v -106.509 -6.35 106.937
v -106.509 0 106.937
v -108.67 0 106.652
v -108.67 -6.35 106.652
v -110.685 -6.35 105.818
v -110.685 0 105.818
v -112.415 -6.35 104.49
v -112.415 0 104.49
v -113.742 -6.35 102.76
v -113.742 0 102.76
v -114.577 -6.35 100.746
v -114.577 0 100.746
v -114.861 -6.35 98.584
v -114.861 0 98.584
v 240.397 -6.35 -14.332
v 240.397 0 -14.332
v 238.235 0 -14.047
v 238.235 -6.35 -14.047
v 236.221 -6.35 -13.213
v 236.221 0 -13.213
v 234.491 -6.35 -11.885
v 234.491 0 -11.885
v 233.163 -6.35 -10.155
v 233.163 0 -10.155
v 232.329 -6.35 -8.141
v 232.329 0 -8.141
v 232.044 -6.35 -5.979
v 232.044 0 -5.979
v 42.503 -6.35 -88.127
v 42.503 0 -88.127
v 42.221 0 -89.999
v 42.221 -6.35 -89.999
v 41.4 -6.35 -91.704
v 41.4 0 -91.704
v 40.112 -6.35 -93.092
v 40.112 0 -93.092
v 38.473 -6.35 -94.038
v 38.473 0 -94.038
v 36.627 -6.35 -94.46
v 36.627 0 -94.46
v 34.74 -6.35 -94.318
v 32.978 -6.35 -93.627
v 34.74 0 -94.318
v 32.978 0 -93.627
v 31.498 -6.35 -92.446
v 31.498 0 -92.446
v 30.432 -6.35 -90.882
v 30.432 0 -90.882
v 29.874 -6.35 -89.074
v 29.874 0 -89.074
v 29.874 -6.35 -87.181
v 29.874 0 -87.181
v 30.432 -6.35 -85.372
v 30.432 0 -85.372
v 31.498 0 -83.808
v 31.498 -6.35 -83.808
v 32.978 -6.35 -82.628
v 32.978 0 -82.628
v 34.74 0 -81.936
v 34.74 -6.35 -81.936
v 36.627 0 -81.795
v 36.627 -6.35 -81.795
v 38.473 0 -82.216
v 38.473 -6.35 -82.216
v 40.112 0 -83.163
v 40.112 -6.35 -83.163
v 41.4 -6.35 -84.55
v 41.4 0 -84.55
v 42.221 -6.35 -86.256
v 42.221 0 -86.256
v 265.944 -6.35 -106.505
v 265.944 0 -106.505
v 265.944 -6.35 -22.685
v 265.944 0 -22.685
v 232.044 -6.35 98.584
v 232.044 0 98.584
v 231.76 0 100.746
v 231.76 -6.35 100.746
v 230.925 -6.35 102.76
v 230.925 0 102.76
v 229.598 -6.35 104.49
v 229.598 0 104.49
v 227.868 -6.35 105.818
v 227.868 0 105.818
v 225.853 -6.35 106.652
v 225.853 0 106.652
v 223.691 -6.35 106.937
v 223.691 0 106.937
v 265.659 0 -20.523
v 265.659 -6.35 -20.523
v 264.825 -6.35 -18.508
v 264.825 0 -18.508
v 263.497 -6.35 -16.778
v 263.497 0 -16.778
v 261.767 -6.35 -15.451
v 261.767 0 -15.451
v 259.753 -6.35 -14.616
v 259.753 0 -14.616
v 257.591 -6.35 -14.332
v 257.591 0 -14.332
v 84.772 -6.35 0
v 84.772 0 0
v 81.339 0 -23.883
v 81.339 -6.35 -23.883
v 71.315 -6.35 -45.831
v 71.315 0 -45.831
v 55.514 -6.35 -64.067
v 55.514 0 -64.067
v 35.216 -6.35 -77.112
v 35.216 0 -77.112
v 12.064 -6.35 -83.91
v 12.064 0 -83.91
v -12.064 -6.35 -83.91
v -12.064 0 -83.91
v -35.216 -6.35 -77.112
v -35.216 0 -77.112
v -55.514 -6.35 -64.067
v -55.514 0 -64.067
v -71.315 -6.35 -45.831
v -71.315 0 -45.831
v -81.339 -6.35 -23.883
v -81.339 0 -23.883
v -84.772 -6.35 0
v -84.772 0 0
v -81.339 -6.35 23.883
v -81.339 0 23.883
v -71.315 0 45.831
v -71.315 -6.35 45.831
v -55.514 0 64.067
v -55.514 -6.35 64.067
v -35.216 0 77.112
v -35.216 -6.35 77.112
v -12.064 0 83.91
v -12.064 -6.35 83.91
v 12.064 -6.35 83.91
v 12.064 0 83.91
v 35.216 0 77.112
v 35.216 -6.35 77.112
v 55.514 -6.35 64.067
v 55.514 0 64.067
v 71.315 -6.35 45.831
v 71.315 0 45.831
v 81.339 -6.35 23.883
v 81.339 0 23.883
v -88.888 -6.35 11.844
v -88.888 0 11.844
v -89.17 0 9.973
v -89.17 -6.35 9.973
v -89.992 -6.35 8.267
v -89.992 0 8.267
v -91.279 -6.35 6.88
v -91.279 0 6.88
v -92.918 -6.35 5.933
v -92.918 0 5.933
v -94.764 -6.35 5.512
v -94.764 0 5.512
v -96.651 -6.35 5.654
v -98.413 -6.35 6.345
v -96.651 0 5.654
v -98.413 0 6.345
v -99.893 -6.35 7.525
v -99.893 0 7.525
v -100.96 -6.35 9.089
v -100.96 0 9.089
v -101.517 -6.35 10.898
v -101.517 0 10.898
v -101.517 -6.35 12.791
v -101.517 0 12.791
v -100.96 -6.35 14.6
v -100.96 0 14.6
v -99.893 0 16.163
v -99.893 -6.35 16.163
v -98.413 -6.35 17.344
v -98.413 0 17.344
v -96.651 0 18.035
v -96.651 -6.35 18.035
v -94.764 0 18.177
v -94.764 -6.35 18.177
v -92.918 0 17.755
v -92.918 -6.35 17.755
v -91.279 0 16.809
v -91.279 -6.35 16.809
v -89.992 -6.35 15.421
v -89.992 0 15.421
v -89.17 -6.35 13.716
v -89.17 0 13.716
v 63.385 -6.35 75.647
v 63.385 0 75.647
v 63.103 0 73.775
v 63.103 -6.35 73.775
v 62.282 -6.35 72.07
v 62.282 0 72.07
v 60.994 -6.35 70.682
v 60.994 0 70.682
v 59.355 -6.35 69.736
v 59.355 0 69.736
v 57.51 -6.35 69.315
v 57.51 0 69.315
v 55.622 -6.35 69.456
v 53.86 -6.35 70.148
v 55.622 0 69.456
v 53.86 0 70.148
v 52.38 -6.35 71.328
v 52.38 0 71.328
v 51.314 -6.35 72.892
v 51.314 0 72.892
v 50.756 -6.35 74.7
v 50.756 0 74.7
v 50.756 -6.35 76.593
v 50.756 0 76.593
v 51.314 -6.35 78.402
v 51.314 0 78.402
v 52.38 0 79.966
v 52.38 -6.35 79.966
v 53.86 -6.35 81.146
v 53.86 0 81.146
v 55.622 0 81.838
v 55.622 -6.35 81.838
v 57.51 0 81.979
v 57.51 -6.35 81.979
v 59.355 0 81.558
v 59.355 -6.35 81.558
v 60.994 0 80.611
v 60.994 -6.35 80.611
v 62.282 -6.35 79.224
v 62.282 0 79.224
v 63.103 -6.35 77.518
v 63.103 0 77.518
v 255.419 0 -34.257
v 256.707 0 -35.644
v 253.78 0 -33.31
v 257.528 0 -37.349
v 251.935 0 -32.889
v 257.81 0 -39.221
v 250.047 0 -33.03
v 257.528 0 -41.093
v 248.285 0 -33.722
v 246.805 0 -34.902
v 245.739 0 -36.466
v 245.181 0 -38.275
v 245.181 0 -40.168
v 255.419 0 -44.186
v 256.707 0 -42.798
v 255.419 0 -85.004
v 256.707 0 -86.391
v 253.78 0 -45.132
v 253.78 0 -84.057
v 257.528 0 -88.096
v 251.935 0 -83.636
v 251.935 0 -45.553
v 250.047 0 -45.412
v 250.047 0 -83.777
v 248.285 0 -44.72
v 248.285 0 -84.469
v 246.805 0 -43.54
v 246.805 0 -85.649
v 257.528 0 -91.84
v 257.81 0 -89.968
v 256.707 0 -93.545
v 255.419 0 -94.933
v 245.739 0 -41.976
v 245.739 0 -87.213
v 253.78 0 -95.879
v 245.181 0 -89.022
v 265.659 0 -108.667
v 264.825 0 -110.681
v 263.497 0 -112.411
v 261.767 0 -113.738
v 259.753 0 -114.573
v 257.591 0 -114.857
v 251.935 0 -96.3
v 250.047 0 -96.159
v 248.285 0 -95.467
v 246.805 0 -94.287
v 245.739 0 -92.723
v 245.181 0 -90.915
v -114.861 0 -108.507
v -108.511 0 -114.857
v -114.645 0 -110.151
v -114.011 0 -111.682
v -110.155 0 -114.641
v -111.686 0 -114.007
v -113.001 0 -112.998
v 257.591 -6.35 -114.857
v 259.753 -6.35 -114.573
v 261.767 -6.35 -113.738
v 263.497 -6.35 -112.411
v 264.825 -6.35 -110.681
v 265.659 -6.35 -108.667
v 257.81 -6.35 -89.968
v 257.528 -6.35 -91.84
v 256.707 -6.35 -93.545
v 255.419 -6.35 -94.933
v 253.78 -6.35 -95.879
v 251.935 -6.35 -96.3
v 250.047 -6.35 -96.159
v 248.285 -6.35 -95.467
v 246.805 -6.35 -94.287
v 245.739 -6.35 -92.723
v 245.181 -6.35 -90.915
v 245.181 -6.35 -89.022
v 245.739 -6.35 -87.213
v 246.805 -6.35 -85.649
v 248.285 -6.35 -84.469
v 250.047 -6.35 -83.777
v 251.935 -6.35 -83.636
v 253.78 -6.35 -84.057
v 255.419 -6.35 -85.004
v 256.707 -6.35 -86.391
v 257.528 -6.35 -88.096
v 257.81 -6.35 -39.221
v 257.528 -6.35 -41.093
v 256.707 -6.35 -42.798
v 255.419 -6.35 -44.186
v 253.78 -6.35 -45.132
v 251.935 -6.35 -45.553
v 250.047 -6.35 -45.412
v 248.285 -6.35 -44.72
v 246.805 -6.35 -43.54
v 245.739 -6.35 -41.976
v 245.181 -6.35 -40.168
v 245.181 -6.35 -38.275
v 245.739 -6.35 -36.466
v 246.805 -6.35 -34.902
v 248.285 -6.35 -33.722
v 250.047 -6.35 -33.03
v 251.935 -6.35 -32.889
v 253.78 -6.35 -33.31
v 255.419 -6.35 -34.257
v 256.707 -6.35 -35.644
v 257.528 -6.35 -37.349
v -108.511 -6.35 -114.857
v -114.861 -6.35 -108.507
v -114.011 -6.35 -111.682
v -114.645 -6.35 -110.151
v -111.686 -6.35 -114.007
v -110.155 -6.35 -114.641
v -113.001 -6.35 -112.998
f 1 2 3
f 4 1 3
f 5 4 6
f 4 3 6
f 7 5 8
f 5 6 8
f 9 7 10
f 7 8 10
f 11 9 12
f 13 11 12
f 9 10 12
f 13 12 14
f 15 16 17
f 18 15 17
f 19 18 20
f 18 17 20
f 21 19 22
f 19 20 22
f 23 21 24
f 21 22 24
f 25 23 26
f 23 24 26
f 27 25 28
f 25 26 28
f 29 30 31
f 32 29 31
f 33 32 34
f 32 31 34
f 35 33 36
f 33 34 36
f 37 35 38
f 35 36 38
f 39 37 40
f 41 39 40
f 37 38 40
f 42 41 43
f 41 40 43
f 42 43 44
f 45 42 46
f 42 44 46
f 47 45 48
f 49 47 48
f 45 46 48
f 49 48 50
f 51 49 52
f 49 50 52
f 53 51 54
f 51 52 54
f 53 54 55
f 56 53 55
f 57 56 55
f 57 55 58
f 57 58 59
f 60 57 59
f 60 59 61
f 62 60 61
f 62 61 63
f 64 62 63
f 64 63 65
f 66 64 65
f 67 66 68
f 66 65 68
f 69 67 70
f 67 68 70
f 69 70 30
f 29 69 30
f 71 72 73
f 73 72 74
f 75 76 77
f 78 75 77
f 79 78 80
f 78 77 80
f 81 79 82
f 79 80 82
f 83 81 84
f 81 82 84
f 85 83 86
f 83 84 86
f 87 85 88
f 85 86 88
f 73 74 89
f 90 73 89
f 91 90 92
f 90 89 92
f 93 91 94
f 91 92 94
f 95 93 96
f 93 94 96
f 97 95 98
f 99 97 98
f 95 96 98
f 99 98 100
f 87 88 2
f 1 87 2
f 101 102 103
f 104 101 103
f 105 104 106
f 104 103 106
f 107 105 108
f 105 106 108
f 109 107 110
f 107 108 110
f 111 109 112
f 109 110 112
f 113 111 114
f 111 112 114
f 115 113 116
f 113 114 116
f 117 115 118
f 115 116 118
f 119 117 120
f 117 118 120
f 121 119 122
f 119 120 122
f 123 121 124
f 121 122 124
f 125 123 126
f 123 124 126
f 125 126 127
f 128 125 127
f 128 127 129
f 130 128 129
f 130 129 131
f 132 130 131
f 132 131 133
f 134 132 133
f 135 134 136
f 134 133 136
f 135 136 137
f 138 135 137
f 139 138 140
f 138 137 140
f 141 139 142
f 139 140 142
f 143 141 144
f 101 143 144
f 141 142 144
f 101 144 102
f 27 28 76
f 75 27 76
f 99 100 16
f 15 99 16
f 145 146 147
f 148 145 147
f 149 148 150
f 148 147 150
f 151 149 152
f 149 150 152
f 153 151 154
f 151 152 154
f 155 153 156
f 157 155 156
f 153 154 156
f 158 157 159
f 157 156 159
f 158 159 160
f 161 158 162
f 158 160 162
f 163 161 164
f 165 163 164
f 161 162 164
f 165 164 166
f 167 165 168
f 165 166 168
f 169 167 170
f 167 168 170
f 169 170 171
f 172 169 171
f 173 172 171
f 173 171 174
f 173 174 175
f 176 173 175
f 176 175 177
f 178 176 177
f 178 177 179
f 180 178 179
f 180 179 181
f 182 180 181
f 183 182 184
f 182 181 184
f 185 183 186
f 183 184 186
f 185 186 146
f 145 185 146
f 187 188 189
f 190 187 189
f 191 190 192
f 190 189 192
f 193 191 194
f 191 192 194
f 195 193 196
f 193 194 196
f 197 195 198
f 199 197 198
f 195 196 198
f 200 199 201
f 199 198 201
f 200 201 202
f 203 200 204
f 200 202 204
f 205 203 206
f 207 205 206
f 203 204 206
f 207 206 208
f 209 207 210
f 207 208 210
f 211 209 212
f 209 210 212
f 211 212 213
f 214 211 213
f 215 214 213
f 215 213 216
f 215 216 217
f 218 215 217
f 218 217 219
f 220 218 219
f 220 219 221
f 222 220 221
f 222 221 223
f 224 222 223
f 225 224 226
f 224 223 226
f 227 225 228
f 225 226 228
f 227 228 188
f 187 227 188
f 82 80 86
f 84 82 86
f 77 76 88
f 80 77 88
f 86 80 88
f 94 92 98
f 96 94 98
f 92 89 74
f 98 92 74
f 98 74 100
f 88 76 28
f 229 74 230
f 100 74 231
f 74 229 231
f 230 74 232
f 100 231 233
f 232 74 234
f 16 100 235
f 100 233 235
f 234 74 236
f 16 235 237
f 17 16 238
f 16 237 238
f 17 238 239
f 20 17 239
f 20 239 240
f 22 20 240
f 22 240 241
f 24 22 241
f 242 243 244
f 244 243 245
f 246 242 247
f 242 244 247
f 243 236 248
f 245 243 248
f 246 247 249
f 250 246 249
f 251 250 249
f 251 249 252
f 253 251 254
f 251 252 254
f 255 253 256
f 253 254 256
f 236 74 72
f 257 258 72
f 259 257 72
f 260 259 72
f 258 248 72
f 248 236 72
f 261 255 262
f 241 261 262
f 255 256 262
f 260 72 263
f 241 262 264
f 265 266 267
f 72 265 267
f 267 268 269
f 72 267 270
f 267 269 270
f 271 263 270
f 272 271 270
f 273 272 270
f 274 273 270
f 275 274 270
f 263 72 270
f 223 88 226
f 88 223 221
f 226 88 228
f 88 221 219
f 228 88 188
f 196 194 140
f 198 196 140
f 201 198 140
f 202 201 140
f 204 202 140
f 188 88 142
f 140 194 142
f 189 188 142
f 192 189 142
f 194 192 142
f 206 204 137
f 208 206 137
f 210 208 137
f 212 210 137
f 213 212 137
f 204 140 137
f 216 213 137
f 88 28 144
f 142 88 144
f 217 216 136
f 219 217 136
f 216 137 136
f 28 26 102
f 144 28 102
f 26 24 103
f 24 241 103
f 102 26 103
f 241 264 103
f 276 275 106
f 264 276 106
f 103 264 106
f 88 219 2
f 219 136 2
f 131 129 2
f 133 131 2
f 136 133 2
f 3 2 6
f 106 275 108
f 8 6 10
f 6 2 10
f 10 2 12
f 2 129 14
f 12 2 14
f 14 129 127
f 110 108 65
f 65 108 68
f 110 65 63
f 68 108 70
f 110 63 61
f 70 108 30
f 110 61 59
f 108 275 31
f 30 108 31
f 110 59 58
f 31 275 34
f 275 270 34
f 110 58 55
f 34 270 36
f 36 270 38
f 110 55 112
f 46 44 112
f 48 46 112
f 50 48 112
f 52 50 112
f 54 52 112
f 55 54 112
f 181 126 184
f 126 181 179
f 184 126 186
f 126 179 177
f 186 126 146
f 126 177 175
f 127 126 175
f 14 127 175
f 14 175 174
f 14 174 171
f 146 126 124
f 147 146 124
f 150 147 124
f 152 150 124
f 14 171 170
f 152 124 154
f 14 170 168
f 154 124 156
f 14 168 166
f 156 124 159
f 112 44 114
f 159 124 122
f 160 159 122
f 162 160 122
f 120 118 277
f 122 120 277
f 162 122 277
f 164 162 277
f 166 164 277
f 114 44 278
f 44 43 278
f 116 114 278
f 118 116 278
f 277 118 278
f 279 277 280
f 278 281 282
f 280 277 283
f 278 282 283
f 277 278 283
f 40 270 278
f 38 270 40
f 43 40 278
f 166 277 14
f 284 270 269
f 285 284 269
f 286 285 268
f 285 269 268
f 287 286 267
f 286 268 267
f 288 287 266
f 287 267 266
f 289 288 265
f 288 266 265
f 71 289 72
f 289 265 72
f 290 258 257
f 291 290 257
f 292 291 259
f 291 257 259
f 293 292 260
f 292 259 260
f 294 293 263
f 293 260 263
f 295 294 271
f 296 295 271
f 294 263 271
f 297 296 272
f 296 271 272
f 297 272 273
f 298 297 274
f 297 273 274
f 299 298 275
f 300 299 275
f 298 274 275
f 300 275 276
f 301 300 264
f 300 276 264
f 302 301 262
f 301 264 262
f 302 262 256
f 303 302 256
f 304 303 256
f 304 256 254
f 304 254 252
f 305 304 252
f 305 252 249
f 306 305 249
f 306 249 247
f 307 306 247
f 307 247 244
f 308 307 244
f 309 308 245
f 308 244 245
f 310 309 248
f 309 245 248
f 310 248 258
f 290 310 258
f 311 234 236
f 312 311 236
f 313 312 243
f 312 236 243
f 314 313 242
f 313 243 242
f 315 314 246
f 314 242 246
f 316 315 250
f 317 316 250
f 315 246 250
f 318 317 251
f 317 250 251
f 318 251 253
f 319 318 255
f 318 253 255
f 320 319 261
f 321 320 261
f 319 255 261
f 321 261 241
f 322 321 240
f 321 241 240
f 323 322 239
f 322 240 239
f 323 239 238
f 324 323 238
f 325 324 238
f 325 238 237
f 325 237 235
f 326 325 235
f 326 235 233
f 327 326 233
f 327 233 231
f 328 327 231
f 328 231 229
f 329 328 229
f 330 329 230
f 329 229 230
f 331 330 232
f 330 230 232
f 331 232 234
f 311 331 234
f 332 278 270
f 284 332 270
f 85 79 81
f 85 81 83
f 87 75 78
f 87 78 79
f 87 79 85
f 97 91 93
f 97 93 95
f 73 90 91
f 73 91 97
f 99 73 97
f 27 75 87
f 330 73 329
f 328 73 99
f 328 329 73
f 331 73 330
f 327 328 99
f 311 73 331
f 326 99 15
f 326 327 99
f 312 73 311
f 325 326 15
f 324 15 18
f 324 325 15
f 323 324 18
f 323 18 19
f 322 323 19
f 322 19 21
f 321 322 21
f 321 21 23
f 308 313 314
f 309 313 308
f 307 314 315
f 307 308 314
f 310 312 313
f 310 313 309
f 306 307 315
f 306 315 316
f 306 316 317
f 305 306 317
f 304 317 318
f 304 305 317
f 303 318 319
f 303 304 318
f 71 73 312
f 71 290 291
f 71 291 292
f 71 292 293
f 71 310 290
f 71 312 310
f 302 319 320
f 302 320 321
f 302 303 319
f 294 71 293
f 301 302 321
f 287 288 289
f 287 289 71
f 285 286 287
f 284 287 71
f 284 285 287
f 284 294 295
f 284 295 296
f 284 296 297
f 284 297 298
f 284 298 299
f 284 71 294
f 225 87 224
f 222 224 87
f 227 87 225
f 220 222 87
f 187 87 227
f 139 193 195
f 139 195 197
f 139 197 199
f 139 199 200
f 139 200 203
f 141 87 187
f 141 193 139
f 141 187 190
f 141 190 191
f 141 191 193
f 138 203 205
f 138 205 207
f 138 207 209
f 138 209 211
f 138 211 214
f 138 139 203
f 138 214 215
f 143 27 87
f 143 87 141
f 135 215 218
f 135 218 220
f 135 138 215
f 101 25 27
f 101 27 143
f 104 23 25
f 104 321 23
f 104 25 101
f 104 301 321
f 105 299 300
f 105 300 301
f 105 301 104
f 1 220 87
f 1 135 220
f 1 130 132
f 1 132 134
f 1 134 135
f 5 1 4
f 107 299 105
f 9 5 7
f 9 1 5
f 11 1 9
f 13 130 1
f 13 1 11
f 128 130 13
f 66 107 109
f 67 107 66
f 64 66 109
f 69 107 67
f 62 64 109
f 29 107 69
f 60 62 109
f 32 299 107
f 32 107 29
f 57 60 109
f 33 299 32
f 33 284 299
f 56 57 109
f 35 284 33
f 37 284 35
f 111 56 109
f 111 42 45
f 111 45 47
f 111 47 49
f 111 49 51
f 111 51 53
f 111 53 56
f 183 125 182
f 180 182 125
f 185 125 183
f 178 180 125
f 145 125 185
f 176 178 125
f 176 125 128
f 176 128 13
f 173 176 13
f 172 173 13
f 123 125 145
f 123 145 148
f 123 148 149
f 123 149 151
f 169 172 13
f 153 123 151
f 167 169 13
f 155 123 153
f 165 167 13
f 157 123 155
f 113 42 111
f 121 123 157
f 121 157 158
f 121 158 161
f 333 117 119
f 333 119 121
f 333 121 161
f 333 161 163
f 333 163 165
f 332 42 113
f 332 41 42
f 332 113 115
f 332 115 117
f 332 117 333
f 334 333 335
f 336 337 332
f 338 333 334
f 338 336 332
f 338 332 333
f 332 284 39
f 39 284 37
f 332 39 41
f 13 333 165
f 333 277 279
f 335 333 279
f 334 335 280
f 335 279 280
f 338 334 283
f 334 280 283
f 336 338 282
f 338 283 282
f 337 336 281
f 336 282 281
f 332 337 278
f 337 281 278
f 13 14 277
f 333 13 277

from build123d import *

# Parameters (mm, degrees)
SKETCH5_R           = 84.7725
SKETCH5_R_2         = 6.35
BOSS_EXTRUDE1_DEPTH = 6.35


with BuildPart() as part:
    # Sketch5 → Boss-Extrude1 (new body)
    with BuildSketch(Plane(origin=(0, 0, 0), x_dir=(1, 0, 0), z_dir=(0, 1, 0))):
        with BuildLine():
            Line((-108.51132569, 114.857435108), (257.591051155, 114.857435108))
            ThreePointArc((257.591051155, 114.857435108), (263.497362796, 112.410960723), (265.943837181, 106.504649083))
            Line((265.943837181, 106.504649083), (265.943837181, 22.684649083))
            ThreePointArc((265.943837181, 22.684649083), (263.497362796, 16.778337443), (257.591051155, 14.331863057))
            Line((257.591051155, 14.331863057), (240.397032386, 14.331863057))
            ThreePointArc((240.397032386, 14.331863057), (234.490720746, 11.885388672), (232.044246361, 5.979077032))
            Line((232.044246361, 5.979077032), (232.044246361, -98.583895379))
            ThreePointArc((232.044246361, -98.583895379), (229.597771976, -104.490207019), (223.691460335, -106.936681404))
            Line((223.691460335, -106.936681404), (-106.508539665, -106.936681404))
            ThreePointArc((-106.508539665, -106.936681404), (-112.414851305, -104.490207019), (-114.86132569, -98.583895379))
            Line((-114.86132569, -98.583895379), (-114.86132569, 108.507435108))
            ThreePointArc((-114.86132569, 108.507435108), (-113.001453751, 112.997563169), (-108.51132569, 114.857435108))
        make_face()
        Circle(SKETCH5_R, mode=Mode.SUBTRACT)
        with Locations((251.46, 89.968152547)):
            Circle(SKETCH5_R_2, mode=Mode.SUBTRACT)
        with Locations((251.46, 39.221145619)):
            Circle(SKETCH5_R_2, mode=Mode.SUBTRACT)
        with Locations((-95.238376165, -11.844376537)):
            Circle(SKETCH5_R_2, mode=Mode.SUBTRACT)
        with Locations((57.035275027, -75.64676797)):
            Circle(SKETCH5_R_2, mode=Mode.SUBTRACT)
        with Locations((36.152941234, 88.127278006)):
            Circle(SKETCH5_R_2, mode=Mode.SUBTRACT)
    extrude(amount=-BOSS_EXTRUDE1_DEPTH)


solid = part.part
